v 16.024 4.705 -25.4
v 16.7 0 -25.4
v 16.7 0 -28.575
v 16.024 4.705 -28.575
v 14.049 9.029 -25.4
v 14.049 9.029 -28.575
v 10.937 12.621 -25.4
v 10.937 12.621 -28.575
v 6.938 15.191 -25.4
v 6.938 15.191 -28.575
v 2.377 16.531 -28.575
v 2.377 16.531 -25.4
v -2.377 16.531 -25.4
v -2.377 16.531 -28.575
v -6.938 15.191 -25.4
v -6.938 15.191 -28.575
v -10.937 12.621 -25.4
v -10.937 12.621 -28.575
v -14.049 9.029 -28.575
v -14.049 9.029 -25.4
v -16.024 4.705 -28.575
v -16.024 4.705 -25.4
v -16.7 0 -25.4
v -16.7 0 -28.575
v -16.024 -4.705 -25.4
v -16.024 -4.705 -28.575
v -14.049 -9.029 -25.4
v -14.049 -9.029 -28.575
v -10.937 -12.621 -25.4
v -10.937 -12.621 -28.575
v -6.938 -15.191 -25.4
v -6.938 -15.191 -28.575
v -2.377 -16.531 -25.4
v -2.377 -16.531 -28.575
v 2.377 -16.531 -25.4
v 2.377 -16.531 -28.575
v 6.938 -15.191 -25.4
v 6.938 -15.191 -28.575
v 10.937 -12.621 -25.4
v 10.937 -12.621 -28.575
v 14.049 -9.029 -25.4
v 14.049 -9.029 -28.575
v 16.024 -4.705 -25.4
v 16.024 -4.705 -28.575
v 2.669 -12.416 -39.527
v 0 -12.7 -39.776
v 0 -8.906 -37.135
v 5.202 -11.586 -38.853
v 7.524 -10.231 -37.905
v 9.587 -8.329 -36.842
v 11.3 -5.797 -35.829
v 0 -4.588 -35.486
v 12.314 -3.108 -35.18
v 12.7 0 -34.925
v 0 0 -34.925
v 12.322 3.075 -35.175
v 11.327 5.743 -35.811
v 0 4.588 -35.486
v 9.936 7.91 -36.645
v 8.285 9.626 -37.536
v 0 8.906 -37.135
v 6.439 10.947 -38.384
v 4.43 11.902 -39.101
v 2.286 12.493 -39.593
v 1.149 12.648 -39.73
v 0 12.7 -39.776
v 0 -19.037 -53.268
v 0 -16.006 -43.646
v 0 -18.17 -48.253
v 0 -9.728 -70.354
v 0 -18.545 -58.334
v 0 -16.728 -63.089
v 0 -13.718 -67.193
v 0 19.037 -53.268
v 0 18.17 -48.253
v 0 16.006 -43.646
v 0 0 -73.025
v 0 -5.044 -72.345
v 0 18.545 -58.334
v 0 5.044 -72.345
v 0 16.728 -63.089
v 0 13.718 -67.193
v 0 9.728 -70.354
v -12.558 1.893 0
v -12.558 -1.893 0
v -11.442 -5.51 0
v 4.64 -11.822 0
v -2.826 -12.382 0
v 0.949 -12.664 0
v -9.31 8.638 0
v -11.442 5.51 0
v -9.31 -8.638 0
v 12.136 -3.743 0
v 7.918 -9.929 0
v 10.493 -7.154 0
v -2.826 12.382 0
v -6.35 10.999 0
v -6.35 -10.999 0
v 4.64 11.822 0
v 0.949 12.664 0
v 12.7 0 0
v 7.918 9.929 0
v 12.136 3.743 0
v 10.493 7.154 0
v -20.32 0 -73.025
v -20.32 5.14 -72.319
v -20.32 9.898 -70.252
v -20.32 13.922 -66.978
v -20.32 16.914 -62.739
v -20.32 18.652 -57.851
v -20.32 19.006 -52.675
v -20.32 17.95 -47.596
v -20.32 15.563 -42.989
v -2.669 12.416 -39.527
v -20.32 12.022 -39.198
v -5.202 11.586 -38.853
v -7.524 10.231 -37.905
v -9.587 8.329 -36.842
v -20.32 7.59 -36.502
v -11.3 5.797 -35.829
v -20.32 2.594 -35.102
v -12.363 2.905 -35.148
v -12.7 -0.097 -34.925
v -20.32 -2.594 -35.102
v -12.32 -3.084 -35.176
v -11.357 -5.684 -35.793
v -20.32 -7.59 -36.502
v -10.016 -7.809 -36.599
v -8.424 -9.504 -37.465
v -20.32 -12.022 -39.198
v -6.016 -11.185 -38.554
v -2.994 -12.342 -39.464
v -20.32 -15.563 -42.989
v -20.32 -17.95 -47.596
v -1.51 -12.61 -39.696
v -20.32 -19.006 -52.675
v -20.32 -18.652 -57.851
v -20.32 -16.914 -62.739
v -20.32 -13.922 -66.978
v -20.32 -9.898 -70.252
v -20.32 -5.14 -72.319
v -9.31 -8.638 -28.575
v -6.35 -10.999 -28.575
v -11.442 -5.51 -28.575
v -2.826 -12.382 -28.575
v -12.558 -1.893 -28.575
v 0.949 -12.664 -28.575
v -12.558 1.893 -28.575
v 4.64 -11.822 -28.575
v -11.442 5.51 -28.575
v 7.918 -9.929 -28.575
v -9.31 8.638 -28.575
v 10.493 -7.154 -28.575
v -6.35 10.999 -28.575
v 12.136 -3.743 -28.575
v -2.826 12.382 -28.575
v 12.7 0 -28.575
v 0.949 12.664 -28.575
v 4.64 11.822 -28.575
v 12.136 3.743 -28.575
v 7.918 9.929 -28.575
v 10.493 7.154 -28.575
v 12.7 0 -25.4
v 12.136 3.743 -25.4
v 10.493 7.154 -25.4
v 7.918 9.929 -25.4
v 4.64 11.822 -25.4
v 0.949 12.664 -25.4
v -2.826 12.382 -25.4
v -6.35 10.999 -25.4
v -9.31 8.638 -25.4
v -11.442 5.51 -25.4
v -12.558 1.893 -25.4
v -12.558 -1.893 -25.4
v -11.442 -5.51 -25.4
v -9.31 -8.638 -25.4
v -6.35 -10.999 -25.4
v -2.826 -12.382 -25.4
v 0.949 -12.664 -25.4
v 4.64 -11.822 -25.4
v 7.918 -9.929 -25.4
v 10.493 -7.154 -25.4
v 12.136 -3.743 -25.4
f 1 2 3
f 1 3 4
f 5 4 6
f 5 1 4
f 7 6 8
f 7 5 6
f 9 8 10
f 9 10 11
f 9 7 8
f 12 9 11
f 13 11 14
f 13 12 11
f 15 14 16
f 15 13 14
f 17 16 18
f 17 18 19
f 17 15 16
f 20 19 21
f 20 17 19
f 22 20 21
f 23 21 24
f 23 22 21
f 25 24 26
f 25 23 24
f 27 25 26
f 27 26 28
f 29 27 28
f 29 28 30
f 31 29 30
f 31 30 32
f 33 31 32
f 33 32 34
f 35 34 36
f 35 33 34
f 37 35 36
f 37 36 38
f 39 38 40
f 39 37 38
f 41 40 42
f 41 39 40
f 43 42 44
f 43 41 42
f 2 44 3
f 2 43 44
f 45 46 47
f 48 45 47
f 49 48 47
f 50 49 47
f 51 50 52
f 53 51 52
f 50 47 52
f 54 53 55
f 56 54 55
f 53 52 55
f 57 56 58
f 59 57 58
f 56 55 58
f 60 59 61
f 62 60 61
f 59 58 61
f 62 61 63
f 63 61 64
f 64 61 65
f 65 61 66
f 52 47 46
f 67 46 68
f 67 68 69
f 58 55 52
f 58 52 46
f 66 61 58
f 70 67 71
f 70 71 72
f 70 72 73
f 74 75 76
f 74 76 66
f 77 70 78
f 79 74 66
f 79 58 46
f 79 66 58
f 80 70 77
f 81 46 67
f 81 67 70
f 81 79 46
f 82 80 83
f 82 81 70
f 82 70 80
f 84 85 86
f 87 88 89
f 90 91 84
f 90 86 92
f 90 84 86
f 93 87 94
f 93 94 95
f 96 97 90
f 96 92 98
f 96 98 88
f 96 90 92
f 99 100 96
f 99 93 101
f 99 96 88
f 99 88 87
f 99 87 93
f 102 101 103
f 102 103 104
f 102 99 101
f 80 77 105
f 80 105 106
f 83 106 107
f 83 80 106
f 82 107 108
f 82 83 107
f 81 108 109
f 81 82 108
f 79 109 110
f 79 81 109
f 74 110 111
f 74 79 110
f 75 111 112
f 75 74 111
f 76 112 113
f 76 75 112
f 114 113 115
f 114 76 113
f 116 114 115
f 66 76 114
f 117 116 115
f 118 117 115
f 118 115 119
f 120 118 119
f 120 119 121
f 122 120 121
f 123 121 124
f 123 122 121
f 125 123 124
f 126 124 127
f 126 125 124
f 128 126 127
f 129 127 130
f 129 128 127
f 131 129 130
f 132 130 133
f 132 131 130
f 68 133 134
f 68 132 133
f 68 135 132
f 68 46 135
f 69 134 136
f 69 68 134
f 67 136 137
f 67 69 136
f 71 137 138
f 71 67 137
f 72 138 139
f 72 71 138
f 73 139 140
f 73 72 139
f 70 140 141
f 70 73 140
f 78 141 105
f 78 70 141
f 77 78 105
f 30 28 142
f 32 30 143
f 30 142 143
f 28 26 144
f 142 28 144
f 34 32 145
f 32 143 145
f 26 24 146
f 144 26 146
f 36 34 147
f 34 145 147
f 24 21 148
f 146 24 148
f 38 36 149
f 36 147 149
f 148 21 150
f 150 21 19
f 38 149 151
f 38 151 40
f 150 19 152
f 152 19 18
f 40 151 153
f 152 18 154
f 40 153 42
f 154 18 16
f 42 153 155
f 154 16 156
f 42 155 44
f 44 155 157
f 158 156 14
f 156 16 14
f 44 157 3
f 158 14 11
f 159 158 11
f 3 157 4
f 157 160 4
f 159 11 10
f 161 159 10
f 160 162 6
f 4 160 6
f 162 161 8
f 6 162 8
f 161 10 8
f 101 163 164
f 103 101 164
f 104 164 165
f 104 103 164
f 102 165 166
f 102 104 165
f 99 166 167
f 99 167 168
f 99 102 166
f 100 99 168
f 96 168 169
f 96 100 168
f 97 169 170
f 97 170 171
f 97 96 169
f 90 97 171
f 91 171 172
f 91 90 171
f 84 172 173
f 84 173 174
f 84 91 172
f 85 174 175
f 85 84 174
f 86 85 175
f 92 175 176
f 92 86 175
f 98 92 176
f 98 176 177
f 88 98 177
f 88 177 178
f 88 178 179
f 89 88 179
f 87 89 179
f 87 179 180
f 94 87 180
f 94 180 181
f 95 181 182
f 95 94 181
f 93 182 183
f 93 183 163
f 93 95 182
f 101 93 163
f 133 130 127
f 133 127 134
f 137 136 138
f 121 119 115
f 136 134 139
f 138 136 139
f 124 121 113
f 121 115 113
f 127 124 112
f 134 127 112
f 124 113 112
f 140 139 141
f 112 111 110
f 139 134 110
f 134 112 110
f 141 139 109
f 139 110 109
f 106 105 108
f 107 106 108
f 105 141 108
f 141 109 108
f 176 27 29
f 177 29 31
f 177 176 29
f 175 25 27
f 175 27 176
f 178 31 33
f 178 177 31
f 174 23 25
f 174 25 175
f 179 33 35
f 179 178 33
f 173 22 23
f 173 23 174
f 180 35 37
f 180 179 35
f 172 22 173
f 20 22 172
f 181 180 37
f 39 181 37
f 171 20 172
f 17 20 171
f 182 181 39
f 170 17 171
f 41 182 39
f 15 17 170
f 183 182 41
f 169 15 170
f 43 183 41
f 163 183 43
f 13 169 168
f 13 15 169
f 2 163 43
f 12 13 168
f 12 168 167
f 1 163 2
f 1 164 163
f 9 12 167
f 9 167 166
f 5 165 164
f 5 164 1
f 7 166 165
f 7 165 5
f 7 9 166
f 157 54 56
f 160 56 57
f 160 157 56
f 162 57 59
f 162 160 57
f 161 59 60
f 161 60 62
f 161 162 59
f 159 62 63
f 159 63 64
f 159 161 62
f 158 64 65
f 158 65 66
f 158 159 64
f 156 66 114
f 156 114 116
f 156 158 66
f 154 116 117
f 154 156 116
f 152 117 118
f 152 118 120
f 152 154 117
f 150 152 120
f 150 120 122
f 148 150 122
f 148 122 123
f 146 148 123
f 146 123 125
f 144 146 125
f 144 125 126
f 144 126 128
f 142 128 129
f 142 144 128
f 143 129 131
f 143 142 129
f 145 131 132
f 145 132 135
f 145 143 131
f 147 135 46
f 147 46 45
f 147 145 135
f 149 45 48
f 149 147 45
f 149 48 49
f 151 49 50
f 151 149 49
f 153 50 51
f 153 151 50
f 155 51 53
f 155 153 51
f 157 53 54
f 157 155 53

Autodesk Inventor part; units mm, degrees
ref_plane "YZ Plane" through (0, 0, 0) normal (1, 0, 0) x (0, 1, 0)
ref_plane "XZ Plane" through (0, 0, 0) normal (0, 1, 0) x (-1, 0, 0)
sketch "Sketch1" plane through (0, 0, 0) normal (0, 0, 1) x (1, 0, 0)
  circle A0 centre (0, 0) radius 12.7
  circle A1 centre (0, 0) radius 16.7005
  dimension "d0" = 25.4
  dimension "d1" = 33.401
extrude "Extrusion1" add sketch "Sketch1" against normal blind 53.975 contours A0
ref_plane "Work Plane1" through (0, 0, -25.4) normal (0, 0, 1) x (1, 0, 0)
sketch "Sketch3" plane through (0, 0, -25.4) normal (0, 0, 1) x (1, 0, 0)
  circle A0 centre (0, 0) radius 16.7005
  dimension "d6" = 33.401
extrude "Extrusion2" add sketch "Sketch3" against normal blind 3.175
sketch "Sketch4" plane through (0, 0, -53.975) normal (0, 0, -1) x (-1, 0, 0)
  line L0 (0, 0) -> (0, 16.7005)
  circle A0 centre (0, 0) radius 16.7005 projected
ref_plane "Work Plane2" through (0, 0, 0) normal (1, 0, 0) x (0, 0, -1)
sketch "Sketch5" plane through (0, 0, 0) normal (1, 0, 0) x (0, 0, -1)
  line L0 (53.975, -12.7) -> (53.975, 12.7) projected
  circle A0 centre (53.975, 0) radius 19.05
  point P0 (0, 0)
  dimension "d9" = 38.1
extrude "Extrusion3" cut sketch "Sketch5" along normal blind 12.7
extrude "Extrusion4" add sketch "Sketch5" against normal blind 20.32
properties part number "Adjustable elbow piece 1 inch"
